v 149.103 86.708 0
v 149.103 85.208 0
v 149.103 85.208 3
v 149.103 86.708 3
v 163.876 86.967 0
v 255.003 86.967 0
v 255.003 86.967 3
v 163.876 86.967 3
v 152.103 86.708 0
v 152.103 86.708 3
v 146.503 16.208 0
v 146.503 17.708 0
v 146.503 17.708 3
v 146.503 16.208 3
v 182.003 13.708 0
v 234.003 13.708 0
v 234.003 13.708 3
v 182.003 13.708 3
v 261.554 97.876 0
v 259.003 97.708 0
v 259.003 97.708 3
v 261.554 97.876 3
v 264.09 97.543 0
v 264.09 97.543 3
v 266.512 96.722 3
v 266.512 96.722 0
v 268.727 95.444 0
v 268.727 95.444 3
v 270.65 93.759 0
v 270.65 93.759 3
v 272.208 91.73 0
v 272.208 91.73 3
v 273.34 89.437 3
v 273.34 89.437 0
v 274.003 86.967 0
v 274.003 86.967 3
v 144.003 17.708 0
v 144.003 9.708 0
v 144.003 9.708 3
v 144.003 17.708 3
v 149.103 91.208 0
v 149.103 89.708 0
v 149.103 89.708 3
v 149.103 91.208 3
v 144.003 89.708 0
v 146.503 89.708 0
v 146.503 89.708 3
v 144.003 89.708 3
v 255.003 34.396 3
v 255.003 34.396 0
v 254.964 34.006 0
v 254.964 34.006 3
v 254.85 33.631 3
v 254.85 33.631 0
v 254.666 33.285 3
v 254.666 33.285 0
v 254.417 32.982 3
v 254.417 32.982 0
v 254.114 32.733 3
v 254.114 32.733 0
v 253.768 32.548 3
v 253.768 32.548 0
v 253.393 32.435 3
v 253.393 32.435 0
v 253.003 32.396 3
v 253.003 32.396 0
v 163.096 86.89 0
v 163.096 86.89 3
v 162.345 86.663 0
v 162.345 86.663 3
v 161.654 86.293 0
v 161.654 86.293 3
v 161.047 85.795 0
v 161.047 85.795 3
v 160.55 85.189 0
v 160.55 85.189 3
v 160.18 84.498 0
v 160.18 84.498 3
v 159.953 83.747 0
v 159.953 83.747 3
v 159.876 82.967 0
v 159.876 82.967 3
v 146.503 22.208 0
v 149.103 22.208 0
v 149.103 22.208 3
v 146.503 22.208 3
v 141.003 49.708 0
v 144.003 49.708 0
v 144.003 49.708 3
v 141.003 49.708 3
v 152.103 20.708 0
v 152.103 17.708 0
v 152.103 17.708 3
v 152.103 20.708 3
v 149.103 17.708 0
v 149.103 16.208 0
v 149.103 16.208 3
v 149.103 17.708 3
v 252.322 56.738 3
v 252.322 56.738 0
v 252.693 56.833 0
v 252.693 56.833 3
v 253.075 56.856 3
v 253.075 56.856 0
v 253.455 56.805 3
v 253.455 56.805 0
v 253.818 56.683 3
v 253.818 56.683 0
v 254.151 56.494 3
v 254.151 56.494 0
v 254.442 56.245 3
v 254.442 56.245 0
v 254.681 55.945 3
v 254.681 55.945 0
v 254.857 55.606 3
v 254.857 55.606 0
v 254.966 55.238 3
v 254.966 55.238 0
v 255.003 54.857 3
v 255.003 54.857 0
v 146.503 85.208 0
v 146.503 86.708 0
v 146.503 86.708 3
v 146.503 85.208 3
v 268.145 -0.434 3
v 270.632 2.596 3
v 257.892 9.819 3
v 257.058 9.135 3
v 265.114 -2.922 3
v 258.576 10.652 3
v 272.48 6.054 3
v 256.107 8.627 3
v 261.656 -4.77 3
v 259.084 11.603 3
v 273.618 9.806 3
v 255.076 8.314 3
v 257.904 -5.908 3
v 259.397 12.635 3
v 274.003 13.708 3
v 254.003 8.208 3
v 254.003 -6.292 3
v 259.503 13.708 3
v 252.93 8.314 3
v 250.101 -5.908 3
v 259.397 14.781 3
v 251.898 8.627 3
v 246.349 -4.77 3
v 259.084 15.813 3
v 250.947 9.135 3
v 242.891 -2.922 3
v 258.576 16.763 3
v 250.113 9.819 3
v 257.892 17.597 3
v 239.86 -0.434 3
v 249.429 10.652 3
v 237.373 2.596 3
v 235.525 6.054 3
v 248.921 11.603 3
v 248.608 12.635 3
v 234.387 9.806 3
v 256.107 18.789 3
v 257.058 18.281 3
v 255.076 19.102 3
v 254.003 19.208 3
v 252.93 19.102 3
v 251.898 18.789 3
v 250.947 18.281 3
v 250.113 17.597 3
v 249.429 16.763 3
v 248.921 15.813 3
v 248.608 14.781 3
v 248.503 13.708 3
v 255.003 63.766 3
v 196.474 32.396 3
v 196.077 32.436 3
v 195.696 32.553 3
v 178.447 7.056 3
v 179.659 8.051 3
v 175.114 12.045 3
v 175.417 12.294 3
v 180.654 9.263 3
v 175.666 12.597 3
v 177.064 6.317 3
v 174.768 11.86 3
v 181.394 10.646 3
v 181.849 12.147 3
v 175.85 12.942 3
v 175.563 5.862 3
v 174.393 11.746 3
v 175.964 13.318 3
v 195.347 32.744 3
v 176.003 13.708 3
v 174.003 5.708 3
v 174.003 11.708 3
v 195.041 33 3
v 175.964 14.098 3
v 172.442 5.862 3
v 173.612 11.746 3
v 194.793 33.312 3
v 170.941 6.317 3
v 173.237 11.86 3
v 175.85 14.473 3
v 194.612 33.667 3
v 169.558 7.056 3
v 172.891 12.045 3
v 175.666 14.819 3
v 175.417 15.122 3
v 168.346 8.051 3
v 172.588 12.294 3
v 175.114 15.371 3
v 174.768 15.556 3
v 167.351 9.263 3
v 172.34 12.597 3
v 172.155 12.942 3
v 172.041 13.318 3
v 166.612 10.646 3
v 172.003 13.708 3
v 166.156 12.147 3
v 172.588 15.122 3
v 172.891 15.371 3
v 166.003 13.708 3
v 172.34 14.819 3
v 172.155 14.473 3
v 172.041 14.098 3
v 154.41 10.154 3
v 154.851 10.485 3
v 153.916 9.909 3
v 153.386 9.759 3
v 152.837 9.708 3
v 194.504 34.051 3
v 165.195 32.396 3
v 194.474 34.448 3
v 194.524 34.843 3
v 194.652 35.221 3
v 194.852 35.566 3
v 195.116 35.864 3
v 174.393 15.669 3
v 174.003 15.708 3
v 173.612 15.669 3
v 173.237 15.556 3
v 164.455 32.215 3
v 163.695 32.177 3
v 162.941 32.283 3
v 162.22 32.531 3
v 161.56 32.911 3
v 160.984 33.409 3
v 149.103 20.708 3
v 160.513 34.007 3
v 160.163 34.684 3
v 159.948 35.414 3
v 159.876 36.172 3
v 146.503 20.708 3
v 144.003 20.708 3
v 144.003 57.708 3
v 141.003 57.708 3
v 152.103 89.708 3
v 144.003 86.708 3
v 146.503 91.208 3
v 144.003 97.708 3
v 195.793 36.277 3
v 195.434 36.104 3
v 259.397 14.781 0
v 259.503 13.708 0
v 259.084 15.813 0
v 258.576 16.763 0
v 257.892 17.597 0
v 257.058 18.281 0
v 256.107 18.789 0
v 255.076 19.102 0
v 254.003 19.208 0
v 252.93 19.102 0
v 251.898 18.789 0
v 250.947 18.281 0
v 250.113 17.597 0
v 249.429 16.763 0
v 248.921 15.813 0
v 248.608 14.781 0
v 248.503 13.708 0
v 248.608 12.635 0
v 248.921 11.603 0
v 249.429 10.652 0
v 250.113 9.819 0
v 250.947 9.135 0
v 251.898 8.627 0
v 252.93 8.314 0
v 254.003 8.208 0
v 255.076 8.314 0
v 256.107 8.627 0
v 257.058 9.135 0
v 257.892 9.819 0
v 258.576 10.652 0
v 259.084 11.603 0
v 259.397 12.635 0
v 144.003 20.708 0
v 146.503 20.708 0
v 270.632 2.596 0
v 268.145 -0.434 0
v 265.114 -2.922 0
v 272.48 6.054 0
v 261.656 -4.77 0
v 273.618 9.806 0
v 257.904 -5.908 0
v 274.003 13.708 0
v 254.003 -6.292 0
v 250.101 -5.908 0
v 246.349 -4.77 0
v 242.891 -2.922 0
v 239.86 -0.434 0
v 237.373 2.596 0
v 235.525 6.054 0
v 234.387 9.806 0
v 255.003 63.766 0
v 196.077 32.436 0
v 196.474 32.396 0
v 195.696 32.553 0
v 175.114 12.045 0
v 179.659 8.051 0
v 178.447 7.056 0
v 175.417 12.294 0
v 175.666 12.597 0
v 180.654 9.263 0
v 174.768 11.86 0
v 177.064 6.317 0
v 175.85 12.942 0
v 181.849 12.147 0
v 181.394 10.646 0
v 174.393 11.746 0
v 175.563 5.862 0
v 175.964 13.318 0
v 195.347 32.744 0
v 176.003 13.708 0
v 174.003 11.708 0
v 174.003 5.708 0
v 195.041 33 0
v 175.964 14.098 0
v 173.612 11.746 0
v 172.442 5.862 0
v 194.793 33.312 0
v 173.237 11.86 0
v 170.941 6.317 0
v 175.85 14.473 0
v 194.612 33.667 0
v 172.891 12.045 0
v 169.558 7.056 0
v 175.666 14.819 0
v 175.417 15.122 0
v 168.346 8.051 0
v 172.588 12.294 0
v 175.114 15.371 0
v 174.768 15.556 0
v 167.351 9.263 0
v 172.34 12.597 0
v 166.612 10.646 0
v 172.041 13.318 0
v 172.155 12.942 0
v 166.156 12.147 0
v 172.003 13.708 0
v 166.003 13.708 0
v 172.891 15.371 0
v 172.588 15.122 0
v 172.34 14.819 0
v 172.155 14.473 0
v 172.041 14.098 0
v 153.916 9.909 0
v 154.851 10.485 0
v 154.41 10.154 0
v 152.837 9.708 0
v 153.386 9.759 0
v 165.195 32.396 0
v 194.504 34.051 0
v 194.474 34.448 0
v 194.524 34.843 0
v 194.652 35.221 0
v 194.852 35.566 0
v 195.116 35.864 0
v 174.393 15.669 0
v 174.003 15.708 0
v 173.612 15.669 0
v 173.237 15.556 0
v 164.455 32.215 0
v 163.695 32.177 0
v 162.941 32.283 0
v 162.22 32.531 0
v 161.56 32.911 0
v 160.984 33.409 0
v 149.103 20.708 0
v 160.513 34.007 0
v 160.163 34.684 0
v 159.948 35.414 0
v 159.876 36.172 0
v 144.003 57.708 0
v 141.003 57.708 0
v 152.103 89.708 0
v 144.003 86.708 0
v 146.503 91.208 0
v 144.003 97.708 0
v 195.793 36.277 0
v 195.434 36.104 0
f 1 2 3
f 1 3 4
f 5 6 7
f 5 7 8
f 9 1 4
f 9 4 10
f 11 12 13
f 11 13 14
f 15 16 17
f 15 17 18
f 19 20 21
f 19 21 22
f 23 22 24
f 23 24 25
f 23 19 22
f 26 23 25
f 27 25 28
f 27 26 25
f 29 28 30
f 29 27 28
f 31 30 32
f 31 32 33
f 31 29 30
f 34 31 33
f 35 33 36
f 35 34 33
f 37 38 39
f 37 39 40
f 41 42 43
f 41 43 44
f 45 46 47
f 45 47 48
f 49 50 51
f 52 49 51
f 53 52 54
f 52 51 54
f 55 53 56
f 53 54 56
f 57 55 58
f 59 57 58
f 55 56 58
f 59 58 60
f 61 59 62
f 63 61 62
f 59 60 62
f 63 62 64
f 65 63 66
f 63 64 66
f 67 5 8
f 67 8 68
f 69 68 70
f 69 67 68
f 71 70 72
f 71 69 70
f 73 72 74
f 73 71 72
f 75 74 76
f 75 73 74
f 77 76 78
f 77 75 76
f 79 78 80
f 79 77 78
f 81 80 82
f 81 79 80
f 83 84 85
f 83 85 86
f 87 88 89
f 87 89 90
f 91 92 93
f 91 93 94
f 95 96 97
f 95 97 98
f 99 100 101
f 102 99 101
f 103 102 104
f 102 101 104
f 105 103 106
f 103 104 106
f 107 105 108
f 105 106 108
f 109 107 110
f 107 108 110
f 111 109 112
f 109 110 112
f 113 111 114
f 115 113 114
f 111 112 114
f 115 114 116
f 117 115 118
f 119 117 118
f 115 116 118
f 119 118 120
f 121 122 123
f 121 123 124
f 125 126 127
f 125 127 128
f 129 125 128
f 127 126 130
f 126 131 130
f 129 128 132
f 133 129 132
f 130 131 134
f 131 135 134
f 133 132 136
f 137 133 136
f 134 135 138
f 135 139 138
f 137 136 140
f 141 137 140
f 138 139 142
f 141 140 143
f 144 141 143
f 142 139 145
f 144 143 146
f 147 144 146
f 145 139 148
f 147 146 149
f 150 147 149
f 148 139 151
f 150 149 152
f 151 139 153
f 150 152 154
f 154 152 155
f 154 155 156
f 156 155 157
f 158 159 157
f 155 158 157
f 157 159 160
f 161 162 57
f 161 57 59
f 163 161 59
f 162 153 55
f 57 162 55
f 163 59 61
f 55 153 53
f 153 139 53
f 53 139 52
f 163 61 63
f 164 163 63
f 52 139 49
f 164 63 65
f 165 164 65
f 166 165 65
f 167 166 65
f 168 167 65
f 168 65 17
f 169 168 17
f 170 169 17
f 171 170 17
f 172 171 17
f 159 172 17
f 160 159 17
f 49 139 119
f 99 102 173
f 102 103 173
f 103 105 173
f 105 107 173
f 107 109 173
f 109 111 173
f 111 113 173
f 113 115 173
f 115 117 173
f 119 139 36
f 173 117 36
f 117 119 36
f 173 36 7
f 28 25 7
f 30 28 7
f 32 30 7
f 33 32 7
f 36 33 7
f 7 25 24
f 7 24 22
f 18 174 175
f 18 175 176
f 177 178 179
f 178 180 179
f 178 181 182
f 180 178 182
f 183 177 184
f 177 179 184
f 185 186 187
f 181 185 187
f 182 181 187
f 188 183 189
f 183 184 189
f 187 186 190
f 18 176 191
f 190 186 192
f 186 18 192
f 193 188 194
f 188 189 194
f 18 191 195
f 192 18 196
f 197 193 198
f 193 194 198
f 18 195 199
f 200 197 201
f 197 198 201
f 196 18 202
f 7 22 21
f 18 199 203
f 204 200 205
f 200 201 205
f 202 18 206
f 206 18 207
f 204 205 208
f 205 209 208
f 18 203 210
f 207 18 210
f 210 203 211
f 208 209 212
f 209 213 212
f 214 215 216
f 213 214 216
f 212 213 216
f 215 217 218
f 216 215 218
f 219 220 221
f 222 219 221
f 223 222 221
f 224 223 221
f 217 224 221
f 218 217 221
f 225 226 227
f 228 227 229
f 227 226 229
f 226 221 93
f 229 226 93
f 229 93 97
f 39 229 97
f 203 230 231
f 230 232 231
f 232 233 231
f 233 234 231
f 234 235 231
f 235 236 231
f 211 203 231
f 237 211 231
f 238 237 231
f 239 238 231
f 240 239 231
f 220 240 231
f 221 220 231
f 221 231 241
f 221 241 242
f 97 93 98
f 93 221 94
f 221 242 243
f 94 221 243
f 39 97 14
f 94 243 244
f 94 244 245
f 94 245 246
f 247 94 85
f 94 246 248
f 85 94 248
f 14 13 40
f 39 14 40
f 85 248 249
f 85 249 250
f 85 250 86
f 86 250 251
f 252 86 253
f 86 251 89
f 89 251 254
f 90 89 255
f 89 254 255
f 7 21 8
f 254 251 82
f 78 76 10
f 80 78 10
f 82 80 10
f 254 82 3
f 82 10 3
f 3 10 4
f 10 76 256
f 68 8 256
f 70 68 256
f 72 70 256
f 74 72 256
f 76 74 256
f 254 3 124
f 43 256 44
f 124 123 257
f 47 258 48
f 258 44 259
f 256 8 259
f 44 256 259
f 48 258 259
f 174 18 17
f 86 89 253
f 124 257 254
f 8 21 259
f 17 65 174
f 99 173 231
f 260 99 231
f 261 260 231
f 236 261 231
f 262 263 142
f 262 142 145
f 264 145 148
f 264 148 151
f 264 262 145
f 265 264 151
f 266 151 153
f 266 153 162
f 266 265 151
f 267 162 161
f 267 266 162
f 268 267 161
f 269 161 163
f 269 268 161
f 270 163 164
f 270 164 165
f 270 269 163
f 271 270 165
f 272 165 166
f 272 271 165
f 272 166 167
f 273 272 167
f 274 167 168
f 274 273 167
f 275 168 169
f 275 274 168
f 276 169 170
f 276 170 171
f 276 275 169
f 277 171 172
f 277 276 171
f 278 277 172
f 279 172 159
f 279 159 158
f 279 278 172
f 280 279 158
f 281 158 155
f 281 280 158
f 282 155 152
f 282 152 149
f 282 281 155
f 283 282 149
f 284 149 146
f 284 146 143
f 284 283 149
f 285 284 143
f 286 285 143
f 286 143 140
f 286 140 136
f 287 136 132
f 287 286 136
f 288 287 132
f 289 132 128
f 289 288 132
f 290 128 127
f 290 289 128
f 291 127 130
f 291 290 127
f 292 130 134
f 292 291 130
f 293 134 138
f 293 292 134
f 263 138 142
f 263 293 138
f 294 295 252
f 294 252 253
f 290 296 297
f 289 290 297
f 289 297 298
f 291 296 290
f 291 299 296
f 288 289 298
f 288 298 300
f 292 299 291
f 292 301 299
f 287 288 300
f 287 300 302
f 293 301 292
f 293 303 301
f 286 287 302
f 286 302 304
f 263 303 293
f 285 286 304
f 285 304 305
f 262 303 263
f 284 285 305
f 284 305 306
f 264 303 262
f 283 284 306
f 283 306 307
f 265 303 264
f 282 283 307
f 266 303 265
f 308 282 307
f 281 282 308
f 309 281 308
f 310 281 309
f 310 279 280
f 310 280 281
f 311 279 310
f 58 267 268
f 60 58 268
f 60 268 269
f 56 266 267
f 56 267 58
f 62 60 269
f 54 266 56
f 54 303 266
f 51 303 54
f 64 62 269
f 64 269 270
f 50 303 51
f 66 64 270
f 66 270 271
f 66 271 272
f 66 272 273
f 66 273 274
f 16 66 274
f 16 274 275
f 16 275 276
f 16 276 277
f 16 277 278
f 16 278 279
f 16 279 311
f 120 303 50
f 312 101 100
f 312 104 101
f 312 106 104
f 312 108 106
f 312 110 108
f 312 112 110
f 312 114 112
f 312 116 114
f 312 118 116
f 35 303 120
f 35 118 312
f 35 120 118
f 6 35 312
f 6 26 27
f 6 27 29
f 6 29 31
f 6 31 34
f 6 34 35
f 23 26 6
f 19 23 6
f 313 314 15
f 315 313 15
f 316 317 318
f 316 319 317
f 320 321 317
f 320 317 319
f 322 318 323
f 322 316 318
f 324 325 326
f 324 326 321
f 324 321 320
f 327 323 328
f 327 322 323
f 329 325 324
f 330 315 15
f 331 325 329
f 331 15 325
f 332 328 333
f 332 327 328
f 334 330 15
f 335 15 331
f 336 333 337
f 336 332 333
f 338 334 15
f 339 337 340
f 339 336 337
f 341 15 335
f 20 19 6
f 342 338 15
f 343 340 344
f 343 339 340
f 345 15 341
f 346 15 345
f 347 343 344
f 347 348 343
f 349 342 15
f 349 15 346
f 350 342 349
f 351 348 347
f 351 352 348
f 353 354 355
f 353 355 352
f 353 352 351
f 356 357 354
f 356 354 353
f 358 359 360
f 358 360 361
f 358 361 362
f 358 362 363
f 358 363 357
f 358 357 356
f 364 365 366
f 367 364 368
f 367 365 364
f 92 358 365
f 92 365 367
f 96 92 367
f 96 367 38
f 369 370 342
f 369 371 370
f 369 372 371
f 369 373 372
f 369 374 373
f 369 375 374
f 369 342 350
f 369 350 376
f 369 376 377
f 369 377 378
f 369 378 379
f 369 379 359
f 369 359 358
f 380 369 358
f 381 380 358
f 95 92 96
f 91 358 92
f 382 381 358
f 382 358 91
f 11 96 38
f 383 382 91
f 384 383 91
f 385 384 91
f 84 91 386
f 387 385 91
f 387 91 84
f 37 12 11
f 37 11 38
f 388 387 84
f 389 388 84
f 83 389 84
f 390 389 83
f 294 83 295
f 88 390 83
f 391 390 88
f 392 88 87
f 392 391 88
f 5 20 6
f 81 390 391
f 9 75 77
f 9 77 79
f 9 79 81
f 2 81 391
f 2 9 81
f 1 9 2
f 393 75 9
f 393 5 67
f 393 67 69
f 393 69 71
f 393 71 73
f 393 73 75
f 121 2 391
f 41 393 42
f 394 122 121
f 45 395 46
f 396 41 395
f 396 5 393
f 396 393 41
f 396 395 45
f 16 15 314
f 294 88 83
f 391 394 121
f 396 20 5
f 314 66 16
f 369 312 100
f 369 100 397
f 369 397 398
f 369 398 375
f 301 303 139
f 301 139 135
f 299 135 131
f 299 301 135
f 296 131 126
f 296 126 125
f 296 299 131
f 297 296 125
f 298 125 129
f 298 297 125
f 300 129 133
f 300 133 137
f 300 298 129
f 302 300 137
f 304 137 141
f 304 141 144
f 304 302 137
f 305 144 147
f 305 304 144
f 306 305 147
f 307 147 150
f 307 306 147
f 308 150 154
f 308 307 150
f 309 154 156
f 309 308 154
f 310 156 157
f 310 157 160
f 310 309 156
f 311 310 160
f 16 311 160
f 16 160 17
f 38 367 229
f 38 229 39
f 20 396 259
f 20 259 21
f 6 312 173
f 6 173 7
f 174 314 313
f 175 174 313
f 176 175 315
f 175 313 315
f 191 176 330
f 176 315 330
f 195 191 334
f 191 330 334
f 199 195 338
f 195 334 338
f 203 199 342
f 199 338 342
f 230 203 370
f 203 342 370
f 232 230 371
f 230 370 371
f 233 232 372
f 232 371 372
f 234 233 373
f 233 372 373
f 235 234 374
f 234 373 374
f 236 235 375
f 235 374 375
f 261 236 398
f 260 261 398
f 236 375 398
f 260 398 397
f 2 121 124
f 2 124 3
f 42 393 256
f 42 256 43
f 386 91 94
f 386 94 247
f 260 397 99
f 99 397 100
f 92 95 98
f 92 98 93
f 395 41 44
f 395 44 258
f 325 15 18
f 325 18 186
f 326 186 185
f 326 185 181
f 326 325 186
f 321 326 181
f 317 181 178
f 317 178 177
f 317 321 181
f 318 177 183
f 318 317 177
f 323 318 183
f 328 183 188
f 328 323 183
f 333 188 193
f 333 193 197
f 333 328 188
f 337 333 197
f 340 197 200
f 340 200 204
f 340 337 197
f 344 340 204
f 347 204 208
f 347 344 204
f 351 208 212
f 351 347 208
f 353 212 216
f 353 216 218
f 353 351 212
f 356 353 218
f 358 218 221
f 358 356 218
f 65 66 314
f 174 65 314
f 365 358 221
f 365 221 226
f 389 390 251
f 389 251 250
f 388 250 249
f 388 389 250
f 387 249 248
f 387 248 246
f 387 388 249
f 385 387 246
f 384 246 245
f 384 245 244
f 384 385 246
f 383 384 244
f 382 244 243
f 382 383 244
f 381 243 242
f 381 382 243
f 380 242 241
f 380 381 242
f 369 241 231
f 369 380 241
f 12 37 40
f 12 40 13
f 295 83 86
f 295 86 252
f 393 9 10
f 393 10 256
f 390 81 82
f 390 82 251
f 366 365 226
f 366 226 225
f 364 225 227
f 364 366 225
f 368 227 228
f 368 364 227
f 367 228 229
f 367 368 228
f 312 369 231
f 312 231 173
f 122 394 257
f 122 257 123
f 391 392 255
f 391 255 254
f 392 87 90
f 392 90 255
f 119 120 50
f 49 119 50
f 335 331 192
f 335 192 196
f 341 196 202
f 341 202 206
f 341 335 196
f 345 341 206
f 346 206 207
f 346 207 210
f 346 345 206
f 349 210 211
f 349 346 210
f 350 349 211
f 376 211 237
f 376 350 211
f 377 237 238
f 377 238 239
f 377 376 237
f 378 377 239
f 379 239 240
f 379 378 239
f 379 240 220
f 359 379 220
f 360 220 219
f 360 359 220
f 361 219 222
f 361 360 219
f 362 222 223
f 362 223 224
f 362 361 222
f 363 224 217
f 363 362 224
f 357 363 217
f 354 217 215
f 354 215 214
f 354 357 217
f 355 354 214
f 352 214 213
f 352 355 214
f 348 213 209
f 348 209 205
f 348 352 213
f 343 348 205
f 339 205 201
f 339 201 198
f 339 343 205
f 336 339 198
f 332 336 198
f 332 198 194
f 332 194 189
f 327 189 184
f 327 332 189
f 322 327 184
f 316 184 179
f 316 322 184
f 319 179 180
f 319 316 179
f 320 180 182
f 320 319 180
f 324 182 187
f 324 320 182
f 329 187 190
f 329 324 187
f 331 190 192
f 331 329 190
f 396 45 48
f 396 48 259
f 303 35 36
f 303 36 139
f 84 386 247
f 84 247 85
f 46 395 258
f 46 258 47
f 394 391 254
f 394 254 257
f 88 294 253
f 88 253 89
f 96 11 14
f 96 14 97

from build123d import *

# Parameters (mm, degrees)
SKETCH_1_R      = 2
SKETCH_1_R_2    = 5.5
EXTRUDE_1_DEPTH = 3


with BuildPart() as part:
    # 草图1 → 凸台-拉伸1 (new body)
    with BuildSketch(Plane.XY):
        with BuildLine():
            Line((234.002581869, 13.707860978), (182.002581869, 13.707860978))
            ThreePointArc((182.002581869, 13.707860978), (174.002581869, 5.707860978), (166.002581869, 13.707860978))
            Line((166.002581869, 13.707860978), (154.850930387, 10.484571811))
            ThreePointArc((154.850930387, 10.484571811), (153.916116795, 9.908765811), (152.836734449, 9.707860978))
            Line((152.836734449, 9.707860978), (144.002581869, 9.707860978))
            Line((144.002581869, 9.707860978), (144.002581869, 17.707860978))
            Line((144.002581869, 17.707860978), (146.502581869, 17.707860978))
            Line((146.502581869, 17.707860978), (146.502581869, 16.207860978))
            Line((146.502581869, 16.207860978), (149.102581869, 16.207860978))
            Line((149.102581869, 16.207860978), (149.102581869, 17.707860978))
            Line((149.102581869, 17.707860978), (152.102581869, 17.707860978))
            Line((152.102581869, 17.707860978), (152.102581869, 20.707860978))
            Line((152.102581869, 20.707860978), (149.102581869, 20.707860978))
            Line((149.102581869, 20.707860978), (149.102581869, 22.207860978))
            Line((149.102581869, 22.207860978), (146.502581869, 22.207860978))
            Line((146.502581869, 22.207860978), (146.502581869, 20.707860978))
            Line((146.502581869, 20.707860978), (144.002581869, 20.707860978))
            Line((144.002581869, 20.707860978), (144.002581869, 49.707860978))
            Line((144.002581869, 49.707860978), (141.002581869, 49.707860978))
            Line((141.002581869, 49.707860978), (141.002581869, 57.707860978))
            Line((141.002581869, 57.707860978), (144.002581869, 57.707860978))
            Line((144.002581869, 57.707860978), (144.002581869, 86.707860978))
            Line((144.002581869, 86.707860978), (146.502581869, 86.707860978))
            Line((146.502581869, 86.707860978), (146.502581869, 85.207860978))
            Line((146.502581869, 85.207860978), (149.102581869, 85.207860978))
            Line((149.102581869, 85.207860978), (149.102581869, 86.707860978))
            Line((149.102581869, 86.707860978), (152.102581869, 86.707860978))
            Line((152.102581869, 86.707860978), (152.102581869, 89.707860978))
            Line((152.102581869, 89.707860978), (149.102581869, 89.707860978))
            Line((149.102581869, 89.707860978), (149.102581869, 91.207860978))
            Line((149.102581869, 91.207860978), (146.502581869, 91.207860978))
            Line((146.502581869, 91.207860978), (146.502581869, 89.707860978))
            Line((146.502581869, 89.707860978), (144.002581869, 89.707860978))
            Line((144.002581869, 89.707860978), (144.002581869, 97.707860978))
            Line((144.002581869, 97.707860978), (154.002581869, 97.707860978))
            Line((154.002581869, 97.707860978), (259.002581869, 97.707860978))
            ThreePointArc((259.002581869, 97.707860978), (268.727085047, 95.444036955), (274.002581869, 86.967009497))
            Line((274.002581869, 86.967009497), (274.002581869, 13.707860978))
            ThreePointArc((274.002581869, 13.707860978), (254.002581869, -6.292139022), (234.002581869, 13.707860978))
        make_face()
        with Locations((174.002581869, 13.707860978)):
            Circle(SKETCH_1_R, mode=Mode.SUBTRACT)
        with Locations((254.002581869, 13.707860978)):
            Circle(SKETCH_1_R_2, mode=Mode.SUBTRACT)
        with BuildLine():
            Line((165.194921817, 32.396144085), (255.002581869, 63.765533121))
            Line((255.002581869, 63.765533121), (255.002581869, 86.967009497))
            Line((255.002581869, 86.967009497), (163.875891268, 86.967009497))
            ThreePointArc((163.875891268, 86.967009497), (161.047464143, 85.795436622), (159.875891268, 82.967009497))
            Line((159.875891268, 82.967009497), (159.875891268, 36.172406577))
            ThreePointArc((159.875891268, 36.172406577), (161.560305186, 32.910802508), (165.194921817, 32.396144085))
        make_face(mode=Mode.SUBTRACT)
        with BuildLine():
            Line((195.793134982, 36.276744779), (252.321890288, 56.737573029))
            ThreePointArc((252.321890288, 56.737573029), (254.151193387, 56.494254101), (255.002581869, 54.856972335))
            Line((255.002581869, 54.856972335), (255.002581869, 34.396144085))
            ThreePointArc((255.002581869, 34.396144085), (254.416795432, 32.981930522), (253.002581869, 32.396144085))
            Line((253.002581869, 32.396144085), (196.473826563, 32.396144085))
            ThreePointArc((196.473826563, 32.396144085), (194.50390253, 34.050602038), (195.793134982, 36.276744779))
        make_face(mode=Mode.SUBTRACT)
    extrude(amount=EXTRUDE_1_DEPTH)


solid = part.part
